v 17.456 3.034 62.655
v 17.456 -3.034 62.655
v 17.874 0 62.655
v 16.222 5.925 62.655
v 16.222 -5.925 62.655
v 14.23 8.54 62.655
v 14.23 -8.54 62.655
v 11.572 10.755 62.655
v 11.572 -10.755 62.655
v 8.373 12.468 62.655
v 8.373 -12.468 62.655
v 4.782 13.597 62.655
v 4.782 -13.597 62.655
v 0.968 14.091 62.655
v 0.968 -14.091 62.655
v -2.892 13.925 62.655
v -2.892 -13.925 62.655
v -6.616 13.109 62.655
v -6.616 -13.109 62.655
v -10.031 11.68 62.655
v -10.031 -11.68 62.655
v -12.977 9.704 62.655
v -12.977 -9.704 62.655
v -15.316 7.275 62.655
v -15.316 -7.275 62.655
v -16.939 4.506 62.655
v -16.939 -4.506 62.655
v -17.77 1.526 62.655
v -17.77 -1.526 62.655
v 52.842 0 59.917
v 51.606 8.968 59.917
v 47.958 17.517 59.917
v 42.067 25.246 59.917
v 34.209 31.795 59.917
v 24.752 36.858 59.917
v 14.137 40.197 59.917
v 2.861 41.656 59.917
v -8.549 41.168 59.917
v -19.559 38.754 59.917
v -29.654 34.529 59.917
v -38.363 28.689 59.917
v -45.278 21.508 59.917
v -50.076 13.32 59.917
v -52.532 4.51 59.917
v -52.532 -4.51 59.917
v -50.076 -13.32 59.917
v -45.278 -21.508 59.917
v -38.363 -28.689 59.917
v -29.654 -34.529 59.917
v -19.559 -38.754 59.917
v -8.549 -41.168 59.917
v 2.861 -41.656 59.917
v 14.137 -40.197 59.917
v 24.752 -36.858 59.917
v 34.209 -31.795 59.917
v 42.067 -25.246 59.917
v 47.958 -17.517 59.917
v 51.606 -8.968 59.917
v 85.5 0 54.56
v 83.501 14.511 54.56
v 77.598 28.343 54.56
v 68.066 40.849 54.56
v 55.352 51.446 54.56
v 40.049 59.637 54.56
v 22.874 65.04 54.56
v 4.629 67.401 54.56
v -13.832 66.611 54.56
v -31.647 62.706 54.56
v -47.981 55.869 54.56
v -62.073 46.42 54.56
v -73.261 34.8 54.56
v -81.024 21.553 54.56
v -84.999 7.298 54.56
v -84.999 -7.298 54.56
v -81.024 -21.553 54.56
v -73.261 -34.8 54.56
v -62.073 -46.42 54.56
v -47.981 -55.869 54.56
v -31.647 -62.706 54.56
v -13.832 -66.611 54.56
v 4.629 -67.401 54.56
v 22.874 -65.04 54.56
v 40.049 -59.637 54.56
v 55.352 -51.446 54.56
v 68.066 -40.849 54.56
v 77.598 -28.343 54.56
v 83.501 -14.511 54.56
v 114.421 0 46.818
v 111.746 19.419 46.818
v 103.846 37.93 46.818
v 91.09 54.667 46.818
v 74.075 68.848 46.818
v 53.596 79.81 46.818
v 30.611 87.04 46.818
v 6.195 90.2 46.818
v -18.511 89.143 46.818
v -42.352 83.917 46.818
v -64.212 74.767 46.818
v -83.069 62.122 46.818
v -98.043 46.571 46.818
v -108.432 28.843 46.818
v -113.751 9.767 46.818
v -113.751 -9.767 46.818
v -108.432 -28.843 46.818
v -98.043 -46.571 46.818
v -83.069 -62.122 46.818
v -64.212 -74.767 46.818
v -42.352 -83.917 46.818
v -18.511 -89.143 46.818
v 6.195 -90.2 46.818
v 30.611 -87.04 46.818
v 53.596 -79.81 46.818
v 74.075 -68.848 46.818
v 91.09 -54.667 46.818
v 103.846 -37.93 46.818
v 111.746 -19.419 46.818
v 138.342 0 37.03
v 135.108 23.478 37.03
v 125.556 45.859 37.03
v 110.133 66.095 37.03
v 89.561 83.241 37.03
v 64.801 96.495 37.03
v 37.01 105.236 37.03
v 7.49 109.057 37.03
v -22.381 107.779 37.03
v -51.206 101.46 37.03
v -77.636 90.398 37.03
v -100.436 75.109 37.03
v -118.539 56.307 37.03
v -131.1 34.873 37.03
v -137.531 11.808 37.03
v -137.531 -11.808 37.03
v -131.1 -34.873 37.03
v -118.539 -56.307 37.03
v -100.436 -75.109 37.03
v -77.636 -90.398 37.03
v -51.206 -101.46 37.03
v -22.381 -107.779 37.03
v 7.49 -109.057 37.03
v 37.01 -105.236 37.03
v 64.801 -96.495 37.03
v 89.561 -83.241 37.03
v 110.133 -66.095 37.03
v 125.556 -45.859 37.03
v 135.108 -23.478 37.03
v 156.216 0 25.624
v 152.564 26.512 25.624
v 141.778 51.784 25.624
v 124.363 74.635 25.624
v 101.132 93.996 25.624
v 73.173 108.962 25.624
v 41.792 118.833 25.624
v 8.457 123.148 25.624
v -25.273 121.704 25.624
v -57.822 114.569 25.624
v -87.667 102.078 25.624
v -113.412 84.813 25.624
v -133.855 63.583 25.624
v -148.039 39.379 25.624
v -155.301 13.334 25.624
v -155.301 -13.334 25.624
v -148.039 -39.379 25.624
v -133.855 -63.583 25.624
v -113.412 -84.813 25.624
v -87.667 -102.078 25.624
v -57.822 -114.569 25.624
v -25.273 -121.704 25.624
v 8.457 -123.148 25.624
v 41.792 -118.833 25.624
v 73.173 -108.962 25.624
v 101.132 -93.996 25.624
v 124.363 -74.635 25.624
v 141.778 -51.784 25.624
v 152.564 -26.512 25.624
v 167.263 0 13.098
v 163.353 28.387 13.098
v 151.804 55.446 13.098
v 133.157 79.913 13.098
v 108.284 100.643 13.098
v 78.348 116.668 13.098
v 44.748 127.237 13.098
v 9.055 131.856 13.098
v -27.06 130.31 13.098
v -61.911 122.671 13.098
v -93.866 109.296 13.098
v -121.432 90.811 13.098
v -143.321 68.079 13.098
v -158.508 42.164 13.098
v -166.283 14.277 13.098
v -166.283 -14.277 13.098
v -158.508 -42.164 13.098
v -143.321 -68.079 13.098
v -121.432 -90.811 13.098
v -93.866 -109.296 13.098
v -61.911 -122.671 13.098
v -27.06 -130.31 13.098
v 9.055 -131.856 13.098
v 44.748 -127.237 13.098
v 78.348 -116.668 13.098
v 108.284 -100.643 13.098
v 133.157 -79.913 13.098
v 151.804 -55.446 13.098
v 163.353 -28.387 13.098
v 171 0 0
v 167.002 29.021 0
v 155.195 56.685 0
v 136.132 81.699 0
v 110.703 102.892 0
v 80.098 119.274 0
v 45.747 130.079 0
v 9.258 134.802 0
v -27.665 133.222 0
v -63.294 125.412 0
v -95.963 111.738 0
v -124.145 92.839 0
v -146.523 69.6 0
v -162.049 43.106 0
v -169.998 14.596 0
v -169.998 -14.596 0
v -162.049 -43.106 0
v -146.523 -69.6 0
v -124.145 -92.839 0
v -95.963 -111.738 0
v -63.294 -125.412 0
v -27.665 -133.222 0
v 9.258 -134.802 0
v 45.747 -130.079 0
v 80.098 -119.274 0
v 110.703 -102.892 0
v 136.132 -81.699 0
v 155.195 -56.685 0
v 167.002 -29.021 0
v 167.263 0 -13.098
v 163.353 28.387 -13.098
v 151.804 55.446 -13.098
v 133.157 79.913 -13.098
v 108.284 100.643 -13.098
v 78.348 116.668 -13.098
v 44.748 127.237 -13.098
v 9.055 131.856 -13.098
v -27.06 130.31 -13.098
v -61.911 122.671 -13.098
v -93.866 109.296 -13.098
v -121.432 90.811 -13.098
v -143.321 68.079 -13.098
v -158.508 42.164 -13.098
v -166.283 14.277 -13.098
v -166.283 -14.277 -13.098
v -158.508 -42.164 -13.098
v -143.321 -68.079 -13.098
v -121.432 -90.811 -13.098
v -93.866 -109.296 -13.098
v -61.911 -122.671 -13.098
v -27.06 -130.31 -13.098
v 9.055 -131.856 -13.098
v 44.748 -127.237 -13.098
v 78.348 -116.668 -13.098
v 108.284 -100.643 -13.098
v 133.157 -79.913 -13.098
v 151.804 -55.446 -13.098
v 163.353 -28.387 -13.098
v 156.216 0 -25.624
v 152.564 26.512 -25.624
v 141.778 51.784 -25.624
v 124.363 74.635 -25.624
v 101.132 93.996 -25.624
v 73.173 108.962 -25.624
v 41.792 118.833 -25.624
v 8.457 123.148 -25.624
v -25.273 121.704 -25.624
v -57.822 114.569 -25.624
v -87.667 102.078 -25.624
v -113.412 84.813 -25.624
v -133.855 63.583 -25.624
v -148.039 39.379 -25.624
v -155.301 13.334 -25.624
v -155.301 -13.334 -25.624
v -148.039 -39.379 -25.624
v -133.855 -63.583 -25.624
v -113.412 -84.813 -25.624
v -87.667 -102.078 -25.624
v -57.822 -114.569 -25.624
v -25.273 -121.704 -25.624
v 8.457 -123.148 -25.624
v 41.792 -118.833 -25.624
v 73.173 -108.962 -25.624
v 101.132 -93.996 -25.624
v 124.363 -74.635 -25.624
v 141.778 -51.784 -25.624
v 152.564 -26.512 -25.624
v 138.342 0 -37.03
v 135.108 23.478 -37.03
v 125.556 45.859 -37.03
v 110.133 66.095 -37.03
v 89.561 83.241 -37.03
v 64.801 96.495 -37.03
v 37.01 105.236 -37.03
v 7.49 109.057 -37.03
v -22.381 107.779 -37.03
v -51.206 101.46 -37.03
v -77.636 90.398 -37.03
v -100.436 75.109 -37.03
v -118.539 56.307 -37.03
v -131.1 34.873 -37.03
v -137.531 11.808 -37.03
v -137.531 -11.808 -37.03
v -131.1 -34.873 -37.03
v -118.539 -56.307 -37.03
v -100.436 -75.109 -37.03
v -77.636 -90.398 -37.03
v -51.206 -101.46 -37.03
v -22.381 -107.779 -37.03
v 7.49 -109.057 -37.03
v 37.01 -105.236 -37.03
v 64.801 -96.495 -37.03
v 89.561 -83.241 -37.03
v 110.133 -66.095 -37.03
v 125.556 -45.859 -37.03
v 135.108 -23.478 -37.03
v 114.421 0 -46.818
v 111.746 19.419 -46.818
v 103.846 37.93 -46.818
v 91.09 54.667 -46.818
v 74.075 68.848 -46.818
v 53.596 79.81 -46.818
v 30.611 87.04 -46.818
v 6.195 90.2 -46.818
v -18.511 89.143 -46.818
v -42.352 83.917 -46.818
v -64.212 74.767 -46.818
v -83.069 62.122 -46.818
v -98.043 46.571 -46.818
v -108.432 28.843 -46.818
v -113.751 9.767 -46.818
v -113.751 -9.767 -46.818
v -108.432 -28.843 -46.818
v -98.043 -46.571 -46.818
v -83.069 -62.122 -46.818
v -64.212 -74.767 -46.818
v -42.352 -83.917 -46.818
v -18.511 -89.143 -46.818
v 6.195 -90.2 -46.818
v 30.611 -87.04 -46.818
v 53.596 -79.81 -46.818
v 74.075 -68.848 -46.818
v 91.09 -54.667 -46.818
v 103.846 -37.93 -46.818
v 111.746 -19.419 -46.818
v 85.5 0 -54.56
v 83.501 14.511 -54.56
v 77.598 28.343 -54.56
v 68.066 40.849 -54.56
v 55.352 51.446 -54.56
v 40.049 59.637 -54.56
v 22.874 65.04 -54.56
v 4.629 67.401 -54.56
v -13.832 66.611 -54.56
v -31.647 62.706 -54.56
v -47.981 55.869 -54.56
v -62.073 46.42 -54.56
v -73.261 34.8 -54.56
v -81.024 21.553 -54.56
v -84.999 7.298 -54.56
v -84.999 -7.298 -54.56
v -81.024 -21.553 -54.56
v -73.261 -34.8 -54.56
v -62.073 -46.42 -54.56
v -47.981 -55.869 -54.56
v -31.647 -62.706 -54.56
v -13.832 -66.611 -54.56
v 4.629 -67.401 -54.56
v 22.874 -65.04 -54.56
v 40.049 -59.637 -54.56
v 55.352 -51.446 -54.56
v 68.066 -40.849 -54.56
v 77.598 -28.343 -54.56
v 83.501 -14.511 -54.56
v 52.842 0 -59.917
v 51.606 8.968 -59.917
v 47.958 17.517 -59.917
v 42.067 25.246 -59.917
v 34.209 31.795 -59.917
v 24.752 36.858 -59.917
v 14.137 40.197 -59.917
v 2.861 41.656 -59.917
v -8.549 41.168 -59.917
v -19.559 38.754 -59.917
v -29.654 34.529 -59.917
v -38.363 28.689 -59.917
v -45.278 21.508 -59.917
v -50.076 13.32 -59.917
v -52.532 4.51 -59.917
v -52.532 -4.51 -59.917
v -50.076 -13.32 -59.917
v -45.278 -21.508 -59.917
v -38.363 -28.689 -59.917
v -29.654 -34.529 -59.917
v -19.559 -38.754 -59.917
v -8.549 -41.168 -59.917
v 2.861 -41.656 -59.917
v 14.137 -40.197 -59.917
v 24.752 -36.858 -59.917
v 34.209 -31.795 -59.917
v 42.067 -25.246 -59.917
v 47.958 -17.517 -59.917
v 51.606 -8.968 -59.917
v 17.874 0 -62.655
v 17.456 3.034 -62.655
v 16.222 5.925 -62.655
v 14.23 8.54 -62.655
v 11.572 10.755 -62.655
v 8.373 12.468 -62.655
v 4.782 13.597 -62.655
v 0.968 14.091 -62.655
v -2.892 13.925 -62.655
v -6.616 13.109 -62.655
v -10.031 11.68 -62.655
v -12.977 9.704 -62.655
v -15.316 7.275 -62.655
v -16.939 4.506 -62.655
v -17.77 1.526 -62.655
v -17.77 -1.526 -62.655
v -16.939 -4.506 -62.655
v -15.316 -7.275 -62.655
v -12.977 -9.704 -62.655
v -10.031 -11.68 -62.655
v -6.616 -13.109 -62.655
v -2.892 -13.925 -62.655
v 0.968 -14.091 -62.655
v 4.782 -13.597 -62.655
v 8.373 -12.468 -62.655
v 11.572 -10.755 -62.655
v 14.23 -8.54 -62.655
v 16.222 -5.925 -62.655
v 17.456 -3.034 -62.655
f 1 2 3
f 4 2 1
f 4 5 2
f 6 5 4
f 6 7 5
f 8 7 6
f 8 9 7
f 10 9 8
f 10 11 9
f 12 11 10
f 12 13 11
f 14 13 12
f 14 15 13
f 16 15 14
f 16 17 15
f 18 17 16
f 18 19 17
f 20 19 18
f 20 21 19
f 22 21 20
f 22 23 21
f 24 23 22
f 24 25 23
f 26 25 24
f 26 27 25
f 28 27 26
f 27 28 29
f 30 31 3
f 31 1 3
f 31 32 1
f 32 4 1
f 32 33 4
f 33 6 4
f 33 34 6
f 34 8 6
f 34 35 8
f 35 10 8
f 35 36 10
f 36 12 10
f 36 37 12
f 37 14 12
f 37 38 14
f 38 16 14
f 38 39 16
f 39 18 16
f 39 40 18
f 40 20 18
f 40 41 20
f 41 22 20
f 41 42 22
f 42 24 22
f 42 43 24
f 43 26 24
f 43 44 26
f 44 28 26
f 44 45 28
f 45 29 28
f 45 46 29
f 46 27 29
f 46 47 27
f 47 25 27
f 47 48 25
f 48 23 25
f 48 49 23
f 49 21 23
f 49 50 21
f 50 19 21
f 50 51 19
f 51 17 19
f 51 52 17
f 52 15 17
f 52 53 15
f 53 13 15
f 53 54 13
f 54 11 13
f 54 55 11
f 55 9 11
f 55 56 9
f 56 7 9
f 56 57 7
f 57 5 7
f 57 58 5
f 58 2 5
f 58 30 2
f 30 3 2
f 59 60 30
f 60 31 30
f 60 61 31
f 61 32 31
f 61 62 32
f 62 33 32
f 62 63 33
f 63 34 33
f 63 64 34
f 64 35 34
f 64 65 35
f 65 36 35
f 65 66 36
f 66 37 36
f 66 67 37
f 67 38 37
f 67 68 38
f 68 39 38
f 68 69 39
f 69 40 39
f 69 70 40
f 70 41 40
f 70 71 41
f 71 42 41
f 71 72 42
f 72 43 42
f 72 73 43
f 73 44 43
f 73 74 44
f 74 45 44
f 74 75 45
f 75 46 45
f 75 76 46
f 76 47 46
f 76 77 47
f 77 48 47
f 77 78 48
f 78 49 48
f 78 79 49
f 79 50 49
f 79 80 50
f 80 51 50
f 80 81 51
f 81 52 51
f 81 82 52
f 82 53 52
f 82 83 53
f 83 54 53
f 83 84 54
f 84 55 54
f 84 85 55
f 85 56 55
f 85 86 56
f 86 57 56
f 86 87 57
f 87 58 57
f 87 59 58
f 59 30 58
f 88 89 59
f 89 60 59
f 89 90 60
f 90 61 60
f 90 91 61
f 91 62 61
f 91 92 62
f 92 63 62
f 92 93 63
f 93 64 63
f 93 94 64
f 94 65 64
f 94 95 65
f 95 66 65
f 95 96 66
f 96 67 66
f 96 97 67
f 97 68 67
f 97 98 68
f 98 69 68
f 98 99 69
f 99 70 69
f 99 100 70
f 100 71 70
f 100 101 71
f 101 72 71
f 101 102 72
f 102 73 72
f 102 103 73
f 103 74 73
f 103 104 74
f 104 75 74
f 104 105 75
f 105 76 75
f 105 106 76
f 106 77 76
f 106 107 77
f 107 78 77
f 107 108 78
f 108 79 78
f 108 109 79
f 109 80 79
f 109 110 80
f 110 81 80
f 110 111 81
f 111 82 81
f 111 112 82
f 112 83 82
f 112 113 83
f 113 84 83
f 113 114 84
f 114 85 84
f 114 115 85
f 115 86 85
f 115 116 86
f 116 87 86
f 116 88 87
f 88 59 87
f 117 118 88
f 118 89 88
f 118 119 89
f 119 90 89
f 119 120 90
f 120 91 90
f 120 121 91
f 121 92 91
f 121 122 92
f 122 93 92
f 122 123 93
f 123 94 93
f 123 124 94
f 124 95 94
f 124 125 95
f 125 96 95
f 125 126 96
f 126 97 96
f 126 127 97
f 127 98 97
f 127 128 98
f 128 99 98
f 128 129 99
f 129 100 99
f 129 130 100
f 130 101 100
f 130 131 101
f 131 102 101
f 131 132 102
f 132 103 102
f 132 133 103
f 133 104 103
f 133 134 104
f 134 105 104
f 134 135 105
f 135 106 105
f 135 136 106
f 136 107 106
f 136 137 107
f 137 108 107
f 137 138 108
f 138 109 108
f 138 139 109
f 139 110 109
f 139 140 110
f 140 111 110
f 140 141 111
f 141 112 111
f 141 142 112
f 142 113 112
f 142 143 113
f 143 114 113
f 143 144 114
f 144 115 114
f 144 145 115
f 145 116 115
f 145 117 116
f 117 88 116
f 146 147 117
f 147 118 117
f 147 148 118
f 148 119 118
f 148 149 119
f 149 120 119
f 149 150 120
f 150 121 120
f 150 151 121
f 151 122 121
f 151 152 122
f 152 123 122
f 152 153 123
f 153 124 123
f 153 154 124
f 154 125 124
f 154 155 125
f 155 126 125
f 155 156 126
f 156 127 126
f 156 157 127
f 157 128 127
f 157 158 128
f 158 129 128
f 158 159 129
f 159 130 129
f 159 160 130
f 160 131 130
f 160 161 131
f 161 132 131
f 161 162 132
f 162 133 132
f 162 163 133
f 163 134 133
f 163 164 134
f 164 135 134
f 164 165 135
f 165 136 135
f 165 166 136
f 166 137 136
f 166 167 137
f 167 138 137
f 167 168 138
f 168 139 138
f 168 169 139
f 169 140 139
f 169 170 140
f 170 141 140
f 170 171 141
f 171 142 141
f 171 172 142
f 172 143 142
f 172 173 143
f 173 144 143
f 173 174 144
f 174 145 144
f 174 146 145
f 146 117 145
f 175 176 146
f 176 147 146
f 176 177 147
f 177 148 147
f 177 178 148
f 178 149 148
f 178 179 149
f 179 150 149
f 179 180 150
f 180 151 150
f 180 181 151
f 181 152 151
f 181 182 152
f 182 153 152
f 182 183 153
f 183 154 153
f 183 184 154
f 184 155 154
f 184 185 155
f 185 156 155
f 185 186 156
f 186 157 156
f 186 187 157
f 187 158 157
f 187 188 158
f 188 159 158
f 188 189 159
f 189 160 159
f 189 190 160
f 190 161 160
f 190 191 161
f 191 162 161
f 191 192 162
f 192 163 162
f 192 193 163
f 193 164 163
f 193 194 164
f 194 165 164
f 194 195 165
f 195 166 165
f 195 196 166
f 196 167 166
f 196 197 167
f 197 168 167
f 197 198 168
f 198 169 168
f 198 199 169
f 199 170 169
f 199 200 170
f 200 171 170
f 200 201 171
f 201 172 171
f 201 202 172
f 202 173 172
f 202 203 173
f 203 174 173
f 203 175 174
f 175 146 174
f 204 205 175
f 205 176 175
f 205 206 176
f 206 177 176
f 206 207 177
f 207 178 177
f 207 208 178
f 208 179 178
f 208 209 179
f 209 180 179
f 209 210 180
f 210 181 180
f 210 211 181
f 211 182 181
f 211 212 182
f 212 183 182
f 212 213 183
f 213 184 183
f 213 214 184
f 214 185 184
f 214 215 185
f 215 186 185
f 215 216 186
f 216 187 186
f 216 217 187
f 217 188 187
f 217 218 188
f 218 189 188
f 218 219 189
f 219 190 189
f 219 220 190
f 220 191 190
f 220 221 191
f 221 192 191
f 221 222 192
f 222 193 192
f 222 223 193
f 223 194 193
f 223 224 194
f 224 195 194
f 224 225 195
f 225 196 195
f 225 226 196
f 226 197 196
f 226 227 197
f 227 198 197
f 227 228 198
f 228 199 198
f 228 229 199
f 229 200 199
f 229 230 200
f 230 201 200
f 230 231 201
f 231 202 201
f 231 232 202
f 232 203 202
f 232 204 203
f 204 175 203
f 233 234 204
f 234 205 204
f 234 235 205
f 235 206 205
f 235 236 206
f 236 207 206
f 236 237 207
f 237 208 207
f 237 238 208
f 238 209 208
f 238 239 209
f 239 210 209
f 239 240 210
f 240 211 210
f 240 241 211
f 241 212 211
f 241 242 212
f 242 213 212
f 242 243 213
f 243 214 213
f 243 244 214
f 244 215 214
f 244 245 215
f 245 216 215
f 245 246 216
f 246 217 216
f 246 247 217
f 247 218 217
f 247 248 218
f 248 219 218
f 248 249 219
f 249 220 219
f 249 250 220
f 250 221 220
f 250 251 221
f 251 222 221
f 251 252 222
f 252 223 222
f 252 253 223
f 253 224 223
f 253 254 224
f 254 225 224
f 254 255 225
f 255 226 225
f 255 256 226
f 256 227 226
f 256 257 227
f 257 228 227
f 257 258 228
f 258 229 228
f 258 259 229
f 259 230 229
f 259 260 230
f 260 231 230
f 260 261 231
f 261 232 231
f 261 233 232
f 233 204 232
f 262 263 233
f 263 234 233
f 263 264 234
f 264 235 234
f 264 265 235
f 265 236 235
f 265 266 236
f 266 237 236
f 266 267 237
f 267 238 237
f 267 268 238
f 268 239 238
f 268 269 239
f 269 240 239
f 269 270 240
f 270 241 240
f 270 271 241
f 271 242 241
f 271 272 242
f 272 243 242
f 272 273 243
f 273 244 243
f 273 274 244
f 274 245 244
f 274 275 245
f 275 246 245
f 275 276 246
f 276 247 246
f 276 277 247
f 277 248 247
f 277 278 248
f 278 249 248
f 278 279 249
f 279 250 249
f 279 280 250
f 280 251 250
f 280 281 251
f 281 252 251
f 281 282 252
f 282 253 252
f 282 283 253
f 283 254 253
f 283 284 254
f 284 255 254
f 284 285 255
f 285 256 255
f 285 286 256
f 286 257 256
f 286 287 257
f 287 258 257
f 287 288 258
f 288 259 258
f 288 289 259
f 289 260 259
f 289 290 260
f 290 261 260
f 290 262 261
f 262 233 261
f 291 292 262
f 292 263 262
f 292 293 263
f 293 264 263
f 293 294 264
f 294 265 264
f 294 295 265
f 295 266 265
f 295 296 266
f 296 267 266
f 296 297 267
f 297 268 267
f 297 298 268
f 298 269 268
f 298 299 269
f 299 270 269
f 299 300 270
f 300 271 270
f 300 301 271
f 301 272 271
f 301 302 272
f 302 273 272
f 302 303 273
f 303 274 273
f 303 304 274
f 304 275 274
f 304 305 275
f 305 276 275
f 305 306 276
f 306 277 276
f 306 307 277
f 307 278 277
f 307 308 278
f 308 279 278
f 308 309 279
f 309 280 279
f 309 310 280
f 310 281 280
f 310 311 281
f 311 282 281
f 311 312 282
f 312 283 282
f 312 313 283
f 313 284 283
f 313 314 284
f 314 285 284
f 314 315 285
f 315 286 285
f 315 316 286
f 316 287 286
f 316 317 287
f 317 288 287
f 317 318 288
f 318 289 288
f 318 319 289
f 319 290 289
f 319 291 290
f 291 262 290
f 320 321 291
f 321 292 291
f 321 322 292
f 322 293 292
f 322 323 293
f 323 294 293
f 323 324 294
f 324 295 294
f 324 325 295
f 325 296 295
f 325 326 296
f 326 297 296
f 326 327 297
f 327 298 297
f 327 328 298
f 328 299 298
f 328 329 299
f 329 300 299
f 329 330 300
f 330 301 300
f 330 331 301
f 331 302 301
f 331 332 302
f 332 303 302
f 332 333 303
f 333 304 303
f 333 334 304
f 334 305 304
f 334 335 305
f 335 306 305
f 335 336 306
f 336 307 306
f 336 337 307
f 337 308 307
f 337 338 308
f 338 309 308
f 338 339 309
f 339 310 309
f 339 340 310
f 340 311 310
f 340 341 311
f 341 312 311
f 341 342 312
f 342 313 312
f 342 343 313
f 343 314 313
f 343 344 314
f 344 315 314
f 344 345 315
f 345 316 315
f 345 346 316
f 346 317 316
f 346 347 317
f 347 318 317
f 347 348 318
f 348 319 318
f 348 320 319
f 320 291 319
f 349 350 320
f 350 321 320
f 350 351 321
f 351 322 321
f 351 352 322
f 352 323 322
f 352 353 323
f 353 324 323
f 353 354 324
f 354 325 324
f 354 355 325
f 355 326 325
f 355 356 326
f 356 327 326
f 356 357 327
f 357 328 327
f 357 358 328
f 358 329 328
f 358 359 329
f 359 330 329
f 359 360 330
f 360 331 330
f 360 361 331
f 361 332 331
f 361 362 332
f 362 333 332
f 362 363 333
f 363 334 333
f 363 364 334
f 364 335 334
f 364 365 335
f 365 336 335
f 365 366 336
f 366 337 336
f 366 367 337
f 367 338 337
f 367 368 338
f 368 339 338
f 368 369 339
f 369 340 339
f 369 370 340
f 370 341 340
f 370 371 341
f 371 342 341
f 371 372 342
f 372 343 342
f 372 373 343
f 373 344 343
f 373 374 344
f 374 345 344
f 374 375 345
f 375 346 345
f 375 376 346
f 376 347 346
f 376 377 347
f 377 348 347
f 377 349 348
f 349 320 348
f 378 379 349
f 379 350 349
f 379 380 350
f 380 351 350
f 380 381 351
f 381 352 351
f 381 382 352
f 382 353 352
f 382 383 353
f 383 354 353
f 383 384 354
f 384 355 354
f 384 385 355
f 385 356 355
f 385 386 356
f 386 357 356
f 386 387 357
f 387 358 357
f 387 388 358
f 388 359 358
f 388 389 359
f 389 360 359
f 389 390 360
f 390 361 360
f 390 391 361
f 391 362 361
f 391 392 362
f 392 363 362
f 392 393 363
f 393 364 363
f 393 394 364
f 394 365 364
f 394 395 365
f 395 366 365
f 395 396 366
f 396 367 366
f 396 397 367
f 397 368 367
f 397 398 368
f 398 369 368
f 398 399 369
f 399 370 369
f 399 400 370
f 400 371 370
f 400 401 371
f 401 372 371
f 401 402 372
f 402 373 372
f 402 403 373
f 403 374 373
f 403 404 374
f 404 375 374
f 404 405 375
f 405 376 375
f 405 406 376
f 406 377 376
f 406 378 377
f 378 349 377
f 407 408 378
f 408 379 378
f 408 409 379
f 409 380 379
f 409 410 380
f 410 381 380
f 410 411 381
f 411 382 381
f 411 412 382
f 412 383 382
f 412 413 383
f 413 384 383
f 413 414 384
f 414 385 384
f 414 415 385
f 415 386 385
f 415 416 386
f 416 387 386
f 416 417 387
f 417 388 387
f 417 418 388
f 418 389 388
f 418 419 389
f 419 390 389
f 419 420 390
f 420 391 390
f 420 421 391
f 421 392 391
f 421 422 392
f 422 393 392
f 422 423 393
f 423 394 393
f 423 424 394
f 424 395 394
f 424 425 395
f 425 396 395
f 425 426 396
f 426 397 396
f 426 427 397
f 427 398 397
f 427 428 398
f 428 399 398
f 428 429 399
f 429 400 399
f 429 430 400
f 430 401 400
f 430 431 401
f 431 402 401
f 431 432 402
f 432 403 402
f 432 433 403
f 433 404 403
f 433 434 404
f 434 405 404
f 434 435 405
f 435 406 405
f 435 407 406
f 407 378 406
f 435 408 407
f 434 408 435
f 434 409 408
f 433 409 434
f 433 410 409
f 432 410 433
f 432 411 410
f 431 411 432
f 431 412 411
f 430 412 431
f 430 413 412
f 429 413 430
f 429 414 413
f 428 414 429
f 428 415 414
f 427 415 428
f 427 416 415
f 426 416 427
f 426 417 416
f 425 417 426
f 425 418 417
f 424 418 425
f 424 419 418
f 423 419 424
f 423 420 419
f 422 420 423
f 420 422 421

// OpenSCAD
// Generated by SolidPython 1.0.1 on 2020-07-29 00:46:54


scale(v = [19, 15, 7]) {
	sphere(r = 9);
}
/***********************************************
*********      SolidPython code:      **********
************************************************
 
# import packages: SolidPython
from solid import *
from solid.utils import *
from itertools import chain, combinations, permutations


class Resize:

    def __init__(self, scad_file):
        self.scad_file = scad_file
        #self.scad_file = import_scad(scad_file)
        # cone/cylinder param:
        self.r1 = 0
        self.r2 = 0
        self.h = 0
        # rectangular prism param:
        self.w = 0
        self.l = 0
        # ellipse param:
        self.r = 0

    # import OpenScad code (file name corresponds to shape)


    # classify shape + parameters
    def assign(self, param1, param2, param3):
        if self.scad_file == 'cone.scad':
            self.r1 = param1
            self.r2 = param2
            self.h = param3
        elif self.scad_file == 'cylinder.scad':
            self.r1 = param1
            self.r2 = param2
            self.h = param3
        elif self.scad_file == 'rectangularPrism.scad':
            self.h = param1
            self.l = param2
            self.w = param3
        else:
            self.r = param1
            self.h = param2

    # resize parameters
    def iterate(self):
        x = range(3, 20, 2)
        i = 1
        if self.scad_file == 'cone.scad':
            tempList = list(permutations(x, 2))
            for temp in tempList:
                param1 = temp[0]
                param2 = temp[1]
                filepath = 'produced_scad_files/' + 'cone' + str(param1) + '_' + str(param2) + '_' + '.scad'
                scad_render_to_file(cylinder(h=param1, r1=param2, r2=0), filepath)

        elif self.scad_file == 'cylinder.scad':
            tempList = list(permutations(x, 3))
            for temp in tempList:
                param1 = temp[0]
                param2 = temp[1]
                filepath = 'produced_scad_files/' + 'cylinder' + str(param1) + '_' + str(param2) + '_' + '.scad'
                scad_render_to_file(cylinder(h=param1, r1=param2, r2=param2), filepath)

        elif self.scad_file == 'rectangularPrism.scad':
            tempList = list(permutations(x, 3))
            for temp in tempList:
                param1 = temp[0]
                param2 = temp[1]
                param3 = temp[2]
                filepath = 'produced_scad_files/' + 'rectangularPrism' + str(param1) + '_' + str(param2) + '_' + str(
                    param3) + '.scad'
                scad_render_to_file(cube(size=(param1, param2, param3)), filepath)

        elif self.scad_file == 'ellipse.scad':
            tempList = list(permutations(x, 4))
            for temp in tempList:
                param1 = temp[0]
                param2 = temp[1]
                param3 = temp[2]
                param4 = temp[3]
                filepath = 'produced_scad_files/' + 'ellipse' + str(param1) + '_' + str(param2) + '_' + str(param3) + '_' + str(param4) + '.scad'
                scad_render_to_file(scale([param1, param2, param3])(sphere(r=param4)), filepath)

    def render_to_scadfile(self):
        scad_render_to_file(scad, 'example.scad') 
 
************************************************/
